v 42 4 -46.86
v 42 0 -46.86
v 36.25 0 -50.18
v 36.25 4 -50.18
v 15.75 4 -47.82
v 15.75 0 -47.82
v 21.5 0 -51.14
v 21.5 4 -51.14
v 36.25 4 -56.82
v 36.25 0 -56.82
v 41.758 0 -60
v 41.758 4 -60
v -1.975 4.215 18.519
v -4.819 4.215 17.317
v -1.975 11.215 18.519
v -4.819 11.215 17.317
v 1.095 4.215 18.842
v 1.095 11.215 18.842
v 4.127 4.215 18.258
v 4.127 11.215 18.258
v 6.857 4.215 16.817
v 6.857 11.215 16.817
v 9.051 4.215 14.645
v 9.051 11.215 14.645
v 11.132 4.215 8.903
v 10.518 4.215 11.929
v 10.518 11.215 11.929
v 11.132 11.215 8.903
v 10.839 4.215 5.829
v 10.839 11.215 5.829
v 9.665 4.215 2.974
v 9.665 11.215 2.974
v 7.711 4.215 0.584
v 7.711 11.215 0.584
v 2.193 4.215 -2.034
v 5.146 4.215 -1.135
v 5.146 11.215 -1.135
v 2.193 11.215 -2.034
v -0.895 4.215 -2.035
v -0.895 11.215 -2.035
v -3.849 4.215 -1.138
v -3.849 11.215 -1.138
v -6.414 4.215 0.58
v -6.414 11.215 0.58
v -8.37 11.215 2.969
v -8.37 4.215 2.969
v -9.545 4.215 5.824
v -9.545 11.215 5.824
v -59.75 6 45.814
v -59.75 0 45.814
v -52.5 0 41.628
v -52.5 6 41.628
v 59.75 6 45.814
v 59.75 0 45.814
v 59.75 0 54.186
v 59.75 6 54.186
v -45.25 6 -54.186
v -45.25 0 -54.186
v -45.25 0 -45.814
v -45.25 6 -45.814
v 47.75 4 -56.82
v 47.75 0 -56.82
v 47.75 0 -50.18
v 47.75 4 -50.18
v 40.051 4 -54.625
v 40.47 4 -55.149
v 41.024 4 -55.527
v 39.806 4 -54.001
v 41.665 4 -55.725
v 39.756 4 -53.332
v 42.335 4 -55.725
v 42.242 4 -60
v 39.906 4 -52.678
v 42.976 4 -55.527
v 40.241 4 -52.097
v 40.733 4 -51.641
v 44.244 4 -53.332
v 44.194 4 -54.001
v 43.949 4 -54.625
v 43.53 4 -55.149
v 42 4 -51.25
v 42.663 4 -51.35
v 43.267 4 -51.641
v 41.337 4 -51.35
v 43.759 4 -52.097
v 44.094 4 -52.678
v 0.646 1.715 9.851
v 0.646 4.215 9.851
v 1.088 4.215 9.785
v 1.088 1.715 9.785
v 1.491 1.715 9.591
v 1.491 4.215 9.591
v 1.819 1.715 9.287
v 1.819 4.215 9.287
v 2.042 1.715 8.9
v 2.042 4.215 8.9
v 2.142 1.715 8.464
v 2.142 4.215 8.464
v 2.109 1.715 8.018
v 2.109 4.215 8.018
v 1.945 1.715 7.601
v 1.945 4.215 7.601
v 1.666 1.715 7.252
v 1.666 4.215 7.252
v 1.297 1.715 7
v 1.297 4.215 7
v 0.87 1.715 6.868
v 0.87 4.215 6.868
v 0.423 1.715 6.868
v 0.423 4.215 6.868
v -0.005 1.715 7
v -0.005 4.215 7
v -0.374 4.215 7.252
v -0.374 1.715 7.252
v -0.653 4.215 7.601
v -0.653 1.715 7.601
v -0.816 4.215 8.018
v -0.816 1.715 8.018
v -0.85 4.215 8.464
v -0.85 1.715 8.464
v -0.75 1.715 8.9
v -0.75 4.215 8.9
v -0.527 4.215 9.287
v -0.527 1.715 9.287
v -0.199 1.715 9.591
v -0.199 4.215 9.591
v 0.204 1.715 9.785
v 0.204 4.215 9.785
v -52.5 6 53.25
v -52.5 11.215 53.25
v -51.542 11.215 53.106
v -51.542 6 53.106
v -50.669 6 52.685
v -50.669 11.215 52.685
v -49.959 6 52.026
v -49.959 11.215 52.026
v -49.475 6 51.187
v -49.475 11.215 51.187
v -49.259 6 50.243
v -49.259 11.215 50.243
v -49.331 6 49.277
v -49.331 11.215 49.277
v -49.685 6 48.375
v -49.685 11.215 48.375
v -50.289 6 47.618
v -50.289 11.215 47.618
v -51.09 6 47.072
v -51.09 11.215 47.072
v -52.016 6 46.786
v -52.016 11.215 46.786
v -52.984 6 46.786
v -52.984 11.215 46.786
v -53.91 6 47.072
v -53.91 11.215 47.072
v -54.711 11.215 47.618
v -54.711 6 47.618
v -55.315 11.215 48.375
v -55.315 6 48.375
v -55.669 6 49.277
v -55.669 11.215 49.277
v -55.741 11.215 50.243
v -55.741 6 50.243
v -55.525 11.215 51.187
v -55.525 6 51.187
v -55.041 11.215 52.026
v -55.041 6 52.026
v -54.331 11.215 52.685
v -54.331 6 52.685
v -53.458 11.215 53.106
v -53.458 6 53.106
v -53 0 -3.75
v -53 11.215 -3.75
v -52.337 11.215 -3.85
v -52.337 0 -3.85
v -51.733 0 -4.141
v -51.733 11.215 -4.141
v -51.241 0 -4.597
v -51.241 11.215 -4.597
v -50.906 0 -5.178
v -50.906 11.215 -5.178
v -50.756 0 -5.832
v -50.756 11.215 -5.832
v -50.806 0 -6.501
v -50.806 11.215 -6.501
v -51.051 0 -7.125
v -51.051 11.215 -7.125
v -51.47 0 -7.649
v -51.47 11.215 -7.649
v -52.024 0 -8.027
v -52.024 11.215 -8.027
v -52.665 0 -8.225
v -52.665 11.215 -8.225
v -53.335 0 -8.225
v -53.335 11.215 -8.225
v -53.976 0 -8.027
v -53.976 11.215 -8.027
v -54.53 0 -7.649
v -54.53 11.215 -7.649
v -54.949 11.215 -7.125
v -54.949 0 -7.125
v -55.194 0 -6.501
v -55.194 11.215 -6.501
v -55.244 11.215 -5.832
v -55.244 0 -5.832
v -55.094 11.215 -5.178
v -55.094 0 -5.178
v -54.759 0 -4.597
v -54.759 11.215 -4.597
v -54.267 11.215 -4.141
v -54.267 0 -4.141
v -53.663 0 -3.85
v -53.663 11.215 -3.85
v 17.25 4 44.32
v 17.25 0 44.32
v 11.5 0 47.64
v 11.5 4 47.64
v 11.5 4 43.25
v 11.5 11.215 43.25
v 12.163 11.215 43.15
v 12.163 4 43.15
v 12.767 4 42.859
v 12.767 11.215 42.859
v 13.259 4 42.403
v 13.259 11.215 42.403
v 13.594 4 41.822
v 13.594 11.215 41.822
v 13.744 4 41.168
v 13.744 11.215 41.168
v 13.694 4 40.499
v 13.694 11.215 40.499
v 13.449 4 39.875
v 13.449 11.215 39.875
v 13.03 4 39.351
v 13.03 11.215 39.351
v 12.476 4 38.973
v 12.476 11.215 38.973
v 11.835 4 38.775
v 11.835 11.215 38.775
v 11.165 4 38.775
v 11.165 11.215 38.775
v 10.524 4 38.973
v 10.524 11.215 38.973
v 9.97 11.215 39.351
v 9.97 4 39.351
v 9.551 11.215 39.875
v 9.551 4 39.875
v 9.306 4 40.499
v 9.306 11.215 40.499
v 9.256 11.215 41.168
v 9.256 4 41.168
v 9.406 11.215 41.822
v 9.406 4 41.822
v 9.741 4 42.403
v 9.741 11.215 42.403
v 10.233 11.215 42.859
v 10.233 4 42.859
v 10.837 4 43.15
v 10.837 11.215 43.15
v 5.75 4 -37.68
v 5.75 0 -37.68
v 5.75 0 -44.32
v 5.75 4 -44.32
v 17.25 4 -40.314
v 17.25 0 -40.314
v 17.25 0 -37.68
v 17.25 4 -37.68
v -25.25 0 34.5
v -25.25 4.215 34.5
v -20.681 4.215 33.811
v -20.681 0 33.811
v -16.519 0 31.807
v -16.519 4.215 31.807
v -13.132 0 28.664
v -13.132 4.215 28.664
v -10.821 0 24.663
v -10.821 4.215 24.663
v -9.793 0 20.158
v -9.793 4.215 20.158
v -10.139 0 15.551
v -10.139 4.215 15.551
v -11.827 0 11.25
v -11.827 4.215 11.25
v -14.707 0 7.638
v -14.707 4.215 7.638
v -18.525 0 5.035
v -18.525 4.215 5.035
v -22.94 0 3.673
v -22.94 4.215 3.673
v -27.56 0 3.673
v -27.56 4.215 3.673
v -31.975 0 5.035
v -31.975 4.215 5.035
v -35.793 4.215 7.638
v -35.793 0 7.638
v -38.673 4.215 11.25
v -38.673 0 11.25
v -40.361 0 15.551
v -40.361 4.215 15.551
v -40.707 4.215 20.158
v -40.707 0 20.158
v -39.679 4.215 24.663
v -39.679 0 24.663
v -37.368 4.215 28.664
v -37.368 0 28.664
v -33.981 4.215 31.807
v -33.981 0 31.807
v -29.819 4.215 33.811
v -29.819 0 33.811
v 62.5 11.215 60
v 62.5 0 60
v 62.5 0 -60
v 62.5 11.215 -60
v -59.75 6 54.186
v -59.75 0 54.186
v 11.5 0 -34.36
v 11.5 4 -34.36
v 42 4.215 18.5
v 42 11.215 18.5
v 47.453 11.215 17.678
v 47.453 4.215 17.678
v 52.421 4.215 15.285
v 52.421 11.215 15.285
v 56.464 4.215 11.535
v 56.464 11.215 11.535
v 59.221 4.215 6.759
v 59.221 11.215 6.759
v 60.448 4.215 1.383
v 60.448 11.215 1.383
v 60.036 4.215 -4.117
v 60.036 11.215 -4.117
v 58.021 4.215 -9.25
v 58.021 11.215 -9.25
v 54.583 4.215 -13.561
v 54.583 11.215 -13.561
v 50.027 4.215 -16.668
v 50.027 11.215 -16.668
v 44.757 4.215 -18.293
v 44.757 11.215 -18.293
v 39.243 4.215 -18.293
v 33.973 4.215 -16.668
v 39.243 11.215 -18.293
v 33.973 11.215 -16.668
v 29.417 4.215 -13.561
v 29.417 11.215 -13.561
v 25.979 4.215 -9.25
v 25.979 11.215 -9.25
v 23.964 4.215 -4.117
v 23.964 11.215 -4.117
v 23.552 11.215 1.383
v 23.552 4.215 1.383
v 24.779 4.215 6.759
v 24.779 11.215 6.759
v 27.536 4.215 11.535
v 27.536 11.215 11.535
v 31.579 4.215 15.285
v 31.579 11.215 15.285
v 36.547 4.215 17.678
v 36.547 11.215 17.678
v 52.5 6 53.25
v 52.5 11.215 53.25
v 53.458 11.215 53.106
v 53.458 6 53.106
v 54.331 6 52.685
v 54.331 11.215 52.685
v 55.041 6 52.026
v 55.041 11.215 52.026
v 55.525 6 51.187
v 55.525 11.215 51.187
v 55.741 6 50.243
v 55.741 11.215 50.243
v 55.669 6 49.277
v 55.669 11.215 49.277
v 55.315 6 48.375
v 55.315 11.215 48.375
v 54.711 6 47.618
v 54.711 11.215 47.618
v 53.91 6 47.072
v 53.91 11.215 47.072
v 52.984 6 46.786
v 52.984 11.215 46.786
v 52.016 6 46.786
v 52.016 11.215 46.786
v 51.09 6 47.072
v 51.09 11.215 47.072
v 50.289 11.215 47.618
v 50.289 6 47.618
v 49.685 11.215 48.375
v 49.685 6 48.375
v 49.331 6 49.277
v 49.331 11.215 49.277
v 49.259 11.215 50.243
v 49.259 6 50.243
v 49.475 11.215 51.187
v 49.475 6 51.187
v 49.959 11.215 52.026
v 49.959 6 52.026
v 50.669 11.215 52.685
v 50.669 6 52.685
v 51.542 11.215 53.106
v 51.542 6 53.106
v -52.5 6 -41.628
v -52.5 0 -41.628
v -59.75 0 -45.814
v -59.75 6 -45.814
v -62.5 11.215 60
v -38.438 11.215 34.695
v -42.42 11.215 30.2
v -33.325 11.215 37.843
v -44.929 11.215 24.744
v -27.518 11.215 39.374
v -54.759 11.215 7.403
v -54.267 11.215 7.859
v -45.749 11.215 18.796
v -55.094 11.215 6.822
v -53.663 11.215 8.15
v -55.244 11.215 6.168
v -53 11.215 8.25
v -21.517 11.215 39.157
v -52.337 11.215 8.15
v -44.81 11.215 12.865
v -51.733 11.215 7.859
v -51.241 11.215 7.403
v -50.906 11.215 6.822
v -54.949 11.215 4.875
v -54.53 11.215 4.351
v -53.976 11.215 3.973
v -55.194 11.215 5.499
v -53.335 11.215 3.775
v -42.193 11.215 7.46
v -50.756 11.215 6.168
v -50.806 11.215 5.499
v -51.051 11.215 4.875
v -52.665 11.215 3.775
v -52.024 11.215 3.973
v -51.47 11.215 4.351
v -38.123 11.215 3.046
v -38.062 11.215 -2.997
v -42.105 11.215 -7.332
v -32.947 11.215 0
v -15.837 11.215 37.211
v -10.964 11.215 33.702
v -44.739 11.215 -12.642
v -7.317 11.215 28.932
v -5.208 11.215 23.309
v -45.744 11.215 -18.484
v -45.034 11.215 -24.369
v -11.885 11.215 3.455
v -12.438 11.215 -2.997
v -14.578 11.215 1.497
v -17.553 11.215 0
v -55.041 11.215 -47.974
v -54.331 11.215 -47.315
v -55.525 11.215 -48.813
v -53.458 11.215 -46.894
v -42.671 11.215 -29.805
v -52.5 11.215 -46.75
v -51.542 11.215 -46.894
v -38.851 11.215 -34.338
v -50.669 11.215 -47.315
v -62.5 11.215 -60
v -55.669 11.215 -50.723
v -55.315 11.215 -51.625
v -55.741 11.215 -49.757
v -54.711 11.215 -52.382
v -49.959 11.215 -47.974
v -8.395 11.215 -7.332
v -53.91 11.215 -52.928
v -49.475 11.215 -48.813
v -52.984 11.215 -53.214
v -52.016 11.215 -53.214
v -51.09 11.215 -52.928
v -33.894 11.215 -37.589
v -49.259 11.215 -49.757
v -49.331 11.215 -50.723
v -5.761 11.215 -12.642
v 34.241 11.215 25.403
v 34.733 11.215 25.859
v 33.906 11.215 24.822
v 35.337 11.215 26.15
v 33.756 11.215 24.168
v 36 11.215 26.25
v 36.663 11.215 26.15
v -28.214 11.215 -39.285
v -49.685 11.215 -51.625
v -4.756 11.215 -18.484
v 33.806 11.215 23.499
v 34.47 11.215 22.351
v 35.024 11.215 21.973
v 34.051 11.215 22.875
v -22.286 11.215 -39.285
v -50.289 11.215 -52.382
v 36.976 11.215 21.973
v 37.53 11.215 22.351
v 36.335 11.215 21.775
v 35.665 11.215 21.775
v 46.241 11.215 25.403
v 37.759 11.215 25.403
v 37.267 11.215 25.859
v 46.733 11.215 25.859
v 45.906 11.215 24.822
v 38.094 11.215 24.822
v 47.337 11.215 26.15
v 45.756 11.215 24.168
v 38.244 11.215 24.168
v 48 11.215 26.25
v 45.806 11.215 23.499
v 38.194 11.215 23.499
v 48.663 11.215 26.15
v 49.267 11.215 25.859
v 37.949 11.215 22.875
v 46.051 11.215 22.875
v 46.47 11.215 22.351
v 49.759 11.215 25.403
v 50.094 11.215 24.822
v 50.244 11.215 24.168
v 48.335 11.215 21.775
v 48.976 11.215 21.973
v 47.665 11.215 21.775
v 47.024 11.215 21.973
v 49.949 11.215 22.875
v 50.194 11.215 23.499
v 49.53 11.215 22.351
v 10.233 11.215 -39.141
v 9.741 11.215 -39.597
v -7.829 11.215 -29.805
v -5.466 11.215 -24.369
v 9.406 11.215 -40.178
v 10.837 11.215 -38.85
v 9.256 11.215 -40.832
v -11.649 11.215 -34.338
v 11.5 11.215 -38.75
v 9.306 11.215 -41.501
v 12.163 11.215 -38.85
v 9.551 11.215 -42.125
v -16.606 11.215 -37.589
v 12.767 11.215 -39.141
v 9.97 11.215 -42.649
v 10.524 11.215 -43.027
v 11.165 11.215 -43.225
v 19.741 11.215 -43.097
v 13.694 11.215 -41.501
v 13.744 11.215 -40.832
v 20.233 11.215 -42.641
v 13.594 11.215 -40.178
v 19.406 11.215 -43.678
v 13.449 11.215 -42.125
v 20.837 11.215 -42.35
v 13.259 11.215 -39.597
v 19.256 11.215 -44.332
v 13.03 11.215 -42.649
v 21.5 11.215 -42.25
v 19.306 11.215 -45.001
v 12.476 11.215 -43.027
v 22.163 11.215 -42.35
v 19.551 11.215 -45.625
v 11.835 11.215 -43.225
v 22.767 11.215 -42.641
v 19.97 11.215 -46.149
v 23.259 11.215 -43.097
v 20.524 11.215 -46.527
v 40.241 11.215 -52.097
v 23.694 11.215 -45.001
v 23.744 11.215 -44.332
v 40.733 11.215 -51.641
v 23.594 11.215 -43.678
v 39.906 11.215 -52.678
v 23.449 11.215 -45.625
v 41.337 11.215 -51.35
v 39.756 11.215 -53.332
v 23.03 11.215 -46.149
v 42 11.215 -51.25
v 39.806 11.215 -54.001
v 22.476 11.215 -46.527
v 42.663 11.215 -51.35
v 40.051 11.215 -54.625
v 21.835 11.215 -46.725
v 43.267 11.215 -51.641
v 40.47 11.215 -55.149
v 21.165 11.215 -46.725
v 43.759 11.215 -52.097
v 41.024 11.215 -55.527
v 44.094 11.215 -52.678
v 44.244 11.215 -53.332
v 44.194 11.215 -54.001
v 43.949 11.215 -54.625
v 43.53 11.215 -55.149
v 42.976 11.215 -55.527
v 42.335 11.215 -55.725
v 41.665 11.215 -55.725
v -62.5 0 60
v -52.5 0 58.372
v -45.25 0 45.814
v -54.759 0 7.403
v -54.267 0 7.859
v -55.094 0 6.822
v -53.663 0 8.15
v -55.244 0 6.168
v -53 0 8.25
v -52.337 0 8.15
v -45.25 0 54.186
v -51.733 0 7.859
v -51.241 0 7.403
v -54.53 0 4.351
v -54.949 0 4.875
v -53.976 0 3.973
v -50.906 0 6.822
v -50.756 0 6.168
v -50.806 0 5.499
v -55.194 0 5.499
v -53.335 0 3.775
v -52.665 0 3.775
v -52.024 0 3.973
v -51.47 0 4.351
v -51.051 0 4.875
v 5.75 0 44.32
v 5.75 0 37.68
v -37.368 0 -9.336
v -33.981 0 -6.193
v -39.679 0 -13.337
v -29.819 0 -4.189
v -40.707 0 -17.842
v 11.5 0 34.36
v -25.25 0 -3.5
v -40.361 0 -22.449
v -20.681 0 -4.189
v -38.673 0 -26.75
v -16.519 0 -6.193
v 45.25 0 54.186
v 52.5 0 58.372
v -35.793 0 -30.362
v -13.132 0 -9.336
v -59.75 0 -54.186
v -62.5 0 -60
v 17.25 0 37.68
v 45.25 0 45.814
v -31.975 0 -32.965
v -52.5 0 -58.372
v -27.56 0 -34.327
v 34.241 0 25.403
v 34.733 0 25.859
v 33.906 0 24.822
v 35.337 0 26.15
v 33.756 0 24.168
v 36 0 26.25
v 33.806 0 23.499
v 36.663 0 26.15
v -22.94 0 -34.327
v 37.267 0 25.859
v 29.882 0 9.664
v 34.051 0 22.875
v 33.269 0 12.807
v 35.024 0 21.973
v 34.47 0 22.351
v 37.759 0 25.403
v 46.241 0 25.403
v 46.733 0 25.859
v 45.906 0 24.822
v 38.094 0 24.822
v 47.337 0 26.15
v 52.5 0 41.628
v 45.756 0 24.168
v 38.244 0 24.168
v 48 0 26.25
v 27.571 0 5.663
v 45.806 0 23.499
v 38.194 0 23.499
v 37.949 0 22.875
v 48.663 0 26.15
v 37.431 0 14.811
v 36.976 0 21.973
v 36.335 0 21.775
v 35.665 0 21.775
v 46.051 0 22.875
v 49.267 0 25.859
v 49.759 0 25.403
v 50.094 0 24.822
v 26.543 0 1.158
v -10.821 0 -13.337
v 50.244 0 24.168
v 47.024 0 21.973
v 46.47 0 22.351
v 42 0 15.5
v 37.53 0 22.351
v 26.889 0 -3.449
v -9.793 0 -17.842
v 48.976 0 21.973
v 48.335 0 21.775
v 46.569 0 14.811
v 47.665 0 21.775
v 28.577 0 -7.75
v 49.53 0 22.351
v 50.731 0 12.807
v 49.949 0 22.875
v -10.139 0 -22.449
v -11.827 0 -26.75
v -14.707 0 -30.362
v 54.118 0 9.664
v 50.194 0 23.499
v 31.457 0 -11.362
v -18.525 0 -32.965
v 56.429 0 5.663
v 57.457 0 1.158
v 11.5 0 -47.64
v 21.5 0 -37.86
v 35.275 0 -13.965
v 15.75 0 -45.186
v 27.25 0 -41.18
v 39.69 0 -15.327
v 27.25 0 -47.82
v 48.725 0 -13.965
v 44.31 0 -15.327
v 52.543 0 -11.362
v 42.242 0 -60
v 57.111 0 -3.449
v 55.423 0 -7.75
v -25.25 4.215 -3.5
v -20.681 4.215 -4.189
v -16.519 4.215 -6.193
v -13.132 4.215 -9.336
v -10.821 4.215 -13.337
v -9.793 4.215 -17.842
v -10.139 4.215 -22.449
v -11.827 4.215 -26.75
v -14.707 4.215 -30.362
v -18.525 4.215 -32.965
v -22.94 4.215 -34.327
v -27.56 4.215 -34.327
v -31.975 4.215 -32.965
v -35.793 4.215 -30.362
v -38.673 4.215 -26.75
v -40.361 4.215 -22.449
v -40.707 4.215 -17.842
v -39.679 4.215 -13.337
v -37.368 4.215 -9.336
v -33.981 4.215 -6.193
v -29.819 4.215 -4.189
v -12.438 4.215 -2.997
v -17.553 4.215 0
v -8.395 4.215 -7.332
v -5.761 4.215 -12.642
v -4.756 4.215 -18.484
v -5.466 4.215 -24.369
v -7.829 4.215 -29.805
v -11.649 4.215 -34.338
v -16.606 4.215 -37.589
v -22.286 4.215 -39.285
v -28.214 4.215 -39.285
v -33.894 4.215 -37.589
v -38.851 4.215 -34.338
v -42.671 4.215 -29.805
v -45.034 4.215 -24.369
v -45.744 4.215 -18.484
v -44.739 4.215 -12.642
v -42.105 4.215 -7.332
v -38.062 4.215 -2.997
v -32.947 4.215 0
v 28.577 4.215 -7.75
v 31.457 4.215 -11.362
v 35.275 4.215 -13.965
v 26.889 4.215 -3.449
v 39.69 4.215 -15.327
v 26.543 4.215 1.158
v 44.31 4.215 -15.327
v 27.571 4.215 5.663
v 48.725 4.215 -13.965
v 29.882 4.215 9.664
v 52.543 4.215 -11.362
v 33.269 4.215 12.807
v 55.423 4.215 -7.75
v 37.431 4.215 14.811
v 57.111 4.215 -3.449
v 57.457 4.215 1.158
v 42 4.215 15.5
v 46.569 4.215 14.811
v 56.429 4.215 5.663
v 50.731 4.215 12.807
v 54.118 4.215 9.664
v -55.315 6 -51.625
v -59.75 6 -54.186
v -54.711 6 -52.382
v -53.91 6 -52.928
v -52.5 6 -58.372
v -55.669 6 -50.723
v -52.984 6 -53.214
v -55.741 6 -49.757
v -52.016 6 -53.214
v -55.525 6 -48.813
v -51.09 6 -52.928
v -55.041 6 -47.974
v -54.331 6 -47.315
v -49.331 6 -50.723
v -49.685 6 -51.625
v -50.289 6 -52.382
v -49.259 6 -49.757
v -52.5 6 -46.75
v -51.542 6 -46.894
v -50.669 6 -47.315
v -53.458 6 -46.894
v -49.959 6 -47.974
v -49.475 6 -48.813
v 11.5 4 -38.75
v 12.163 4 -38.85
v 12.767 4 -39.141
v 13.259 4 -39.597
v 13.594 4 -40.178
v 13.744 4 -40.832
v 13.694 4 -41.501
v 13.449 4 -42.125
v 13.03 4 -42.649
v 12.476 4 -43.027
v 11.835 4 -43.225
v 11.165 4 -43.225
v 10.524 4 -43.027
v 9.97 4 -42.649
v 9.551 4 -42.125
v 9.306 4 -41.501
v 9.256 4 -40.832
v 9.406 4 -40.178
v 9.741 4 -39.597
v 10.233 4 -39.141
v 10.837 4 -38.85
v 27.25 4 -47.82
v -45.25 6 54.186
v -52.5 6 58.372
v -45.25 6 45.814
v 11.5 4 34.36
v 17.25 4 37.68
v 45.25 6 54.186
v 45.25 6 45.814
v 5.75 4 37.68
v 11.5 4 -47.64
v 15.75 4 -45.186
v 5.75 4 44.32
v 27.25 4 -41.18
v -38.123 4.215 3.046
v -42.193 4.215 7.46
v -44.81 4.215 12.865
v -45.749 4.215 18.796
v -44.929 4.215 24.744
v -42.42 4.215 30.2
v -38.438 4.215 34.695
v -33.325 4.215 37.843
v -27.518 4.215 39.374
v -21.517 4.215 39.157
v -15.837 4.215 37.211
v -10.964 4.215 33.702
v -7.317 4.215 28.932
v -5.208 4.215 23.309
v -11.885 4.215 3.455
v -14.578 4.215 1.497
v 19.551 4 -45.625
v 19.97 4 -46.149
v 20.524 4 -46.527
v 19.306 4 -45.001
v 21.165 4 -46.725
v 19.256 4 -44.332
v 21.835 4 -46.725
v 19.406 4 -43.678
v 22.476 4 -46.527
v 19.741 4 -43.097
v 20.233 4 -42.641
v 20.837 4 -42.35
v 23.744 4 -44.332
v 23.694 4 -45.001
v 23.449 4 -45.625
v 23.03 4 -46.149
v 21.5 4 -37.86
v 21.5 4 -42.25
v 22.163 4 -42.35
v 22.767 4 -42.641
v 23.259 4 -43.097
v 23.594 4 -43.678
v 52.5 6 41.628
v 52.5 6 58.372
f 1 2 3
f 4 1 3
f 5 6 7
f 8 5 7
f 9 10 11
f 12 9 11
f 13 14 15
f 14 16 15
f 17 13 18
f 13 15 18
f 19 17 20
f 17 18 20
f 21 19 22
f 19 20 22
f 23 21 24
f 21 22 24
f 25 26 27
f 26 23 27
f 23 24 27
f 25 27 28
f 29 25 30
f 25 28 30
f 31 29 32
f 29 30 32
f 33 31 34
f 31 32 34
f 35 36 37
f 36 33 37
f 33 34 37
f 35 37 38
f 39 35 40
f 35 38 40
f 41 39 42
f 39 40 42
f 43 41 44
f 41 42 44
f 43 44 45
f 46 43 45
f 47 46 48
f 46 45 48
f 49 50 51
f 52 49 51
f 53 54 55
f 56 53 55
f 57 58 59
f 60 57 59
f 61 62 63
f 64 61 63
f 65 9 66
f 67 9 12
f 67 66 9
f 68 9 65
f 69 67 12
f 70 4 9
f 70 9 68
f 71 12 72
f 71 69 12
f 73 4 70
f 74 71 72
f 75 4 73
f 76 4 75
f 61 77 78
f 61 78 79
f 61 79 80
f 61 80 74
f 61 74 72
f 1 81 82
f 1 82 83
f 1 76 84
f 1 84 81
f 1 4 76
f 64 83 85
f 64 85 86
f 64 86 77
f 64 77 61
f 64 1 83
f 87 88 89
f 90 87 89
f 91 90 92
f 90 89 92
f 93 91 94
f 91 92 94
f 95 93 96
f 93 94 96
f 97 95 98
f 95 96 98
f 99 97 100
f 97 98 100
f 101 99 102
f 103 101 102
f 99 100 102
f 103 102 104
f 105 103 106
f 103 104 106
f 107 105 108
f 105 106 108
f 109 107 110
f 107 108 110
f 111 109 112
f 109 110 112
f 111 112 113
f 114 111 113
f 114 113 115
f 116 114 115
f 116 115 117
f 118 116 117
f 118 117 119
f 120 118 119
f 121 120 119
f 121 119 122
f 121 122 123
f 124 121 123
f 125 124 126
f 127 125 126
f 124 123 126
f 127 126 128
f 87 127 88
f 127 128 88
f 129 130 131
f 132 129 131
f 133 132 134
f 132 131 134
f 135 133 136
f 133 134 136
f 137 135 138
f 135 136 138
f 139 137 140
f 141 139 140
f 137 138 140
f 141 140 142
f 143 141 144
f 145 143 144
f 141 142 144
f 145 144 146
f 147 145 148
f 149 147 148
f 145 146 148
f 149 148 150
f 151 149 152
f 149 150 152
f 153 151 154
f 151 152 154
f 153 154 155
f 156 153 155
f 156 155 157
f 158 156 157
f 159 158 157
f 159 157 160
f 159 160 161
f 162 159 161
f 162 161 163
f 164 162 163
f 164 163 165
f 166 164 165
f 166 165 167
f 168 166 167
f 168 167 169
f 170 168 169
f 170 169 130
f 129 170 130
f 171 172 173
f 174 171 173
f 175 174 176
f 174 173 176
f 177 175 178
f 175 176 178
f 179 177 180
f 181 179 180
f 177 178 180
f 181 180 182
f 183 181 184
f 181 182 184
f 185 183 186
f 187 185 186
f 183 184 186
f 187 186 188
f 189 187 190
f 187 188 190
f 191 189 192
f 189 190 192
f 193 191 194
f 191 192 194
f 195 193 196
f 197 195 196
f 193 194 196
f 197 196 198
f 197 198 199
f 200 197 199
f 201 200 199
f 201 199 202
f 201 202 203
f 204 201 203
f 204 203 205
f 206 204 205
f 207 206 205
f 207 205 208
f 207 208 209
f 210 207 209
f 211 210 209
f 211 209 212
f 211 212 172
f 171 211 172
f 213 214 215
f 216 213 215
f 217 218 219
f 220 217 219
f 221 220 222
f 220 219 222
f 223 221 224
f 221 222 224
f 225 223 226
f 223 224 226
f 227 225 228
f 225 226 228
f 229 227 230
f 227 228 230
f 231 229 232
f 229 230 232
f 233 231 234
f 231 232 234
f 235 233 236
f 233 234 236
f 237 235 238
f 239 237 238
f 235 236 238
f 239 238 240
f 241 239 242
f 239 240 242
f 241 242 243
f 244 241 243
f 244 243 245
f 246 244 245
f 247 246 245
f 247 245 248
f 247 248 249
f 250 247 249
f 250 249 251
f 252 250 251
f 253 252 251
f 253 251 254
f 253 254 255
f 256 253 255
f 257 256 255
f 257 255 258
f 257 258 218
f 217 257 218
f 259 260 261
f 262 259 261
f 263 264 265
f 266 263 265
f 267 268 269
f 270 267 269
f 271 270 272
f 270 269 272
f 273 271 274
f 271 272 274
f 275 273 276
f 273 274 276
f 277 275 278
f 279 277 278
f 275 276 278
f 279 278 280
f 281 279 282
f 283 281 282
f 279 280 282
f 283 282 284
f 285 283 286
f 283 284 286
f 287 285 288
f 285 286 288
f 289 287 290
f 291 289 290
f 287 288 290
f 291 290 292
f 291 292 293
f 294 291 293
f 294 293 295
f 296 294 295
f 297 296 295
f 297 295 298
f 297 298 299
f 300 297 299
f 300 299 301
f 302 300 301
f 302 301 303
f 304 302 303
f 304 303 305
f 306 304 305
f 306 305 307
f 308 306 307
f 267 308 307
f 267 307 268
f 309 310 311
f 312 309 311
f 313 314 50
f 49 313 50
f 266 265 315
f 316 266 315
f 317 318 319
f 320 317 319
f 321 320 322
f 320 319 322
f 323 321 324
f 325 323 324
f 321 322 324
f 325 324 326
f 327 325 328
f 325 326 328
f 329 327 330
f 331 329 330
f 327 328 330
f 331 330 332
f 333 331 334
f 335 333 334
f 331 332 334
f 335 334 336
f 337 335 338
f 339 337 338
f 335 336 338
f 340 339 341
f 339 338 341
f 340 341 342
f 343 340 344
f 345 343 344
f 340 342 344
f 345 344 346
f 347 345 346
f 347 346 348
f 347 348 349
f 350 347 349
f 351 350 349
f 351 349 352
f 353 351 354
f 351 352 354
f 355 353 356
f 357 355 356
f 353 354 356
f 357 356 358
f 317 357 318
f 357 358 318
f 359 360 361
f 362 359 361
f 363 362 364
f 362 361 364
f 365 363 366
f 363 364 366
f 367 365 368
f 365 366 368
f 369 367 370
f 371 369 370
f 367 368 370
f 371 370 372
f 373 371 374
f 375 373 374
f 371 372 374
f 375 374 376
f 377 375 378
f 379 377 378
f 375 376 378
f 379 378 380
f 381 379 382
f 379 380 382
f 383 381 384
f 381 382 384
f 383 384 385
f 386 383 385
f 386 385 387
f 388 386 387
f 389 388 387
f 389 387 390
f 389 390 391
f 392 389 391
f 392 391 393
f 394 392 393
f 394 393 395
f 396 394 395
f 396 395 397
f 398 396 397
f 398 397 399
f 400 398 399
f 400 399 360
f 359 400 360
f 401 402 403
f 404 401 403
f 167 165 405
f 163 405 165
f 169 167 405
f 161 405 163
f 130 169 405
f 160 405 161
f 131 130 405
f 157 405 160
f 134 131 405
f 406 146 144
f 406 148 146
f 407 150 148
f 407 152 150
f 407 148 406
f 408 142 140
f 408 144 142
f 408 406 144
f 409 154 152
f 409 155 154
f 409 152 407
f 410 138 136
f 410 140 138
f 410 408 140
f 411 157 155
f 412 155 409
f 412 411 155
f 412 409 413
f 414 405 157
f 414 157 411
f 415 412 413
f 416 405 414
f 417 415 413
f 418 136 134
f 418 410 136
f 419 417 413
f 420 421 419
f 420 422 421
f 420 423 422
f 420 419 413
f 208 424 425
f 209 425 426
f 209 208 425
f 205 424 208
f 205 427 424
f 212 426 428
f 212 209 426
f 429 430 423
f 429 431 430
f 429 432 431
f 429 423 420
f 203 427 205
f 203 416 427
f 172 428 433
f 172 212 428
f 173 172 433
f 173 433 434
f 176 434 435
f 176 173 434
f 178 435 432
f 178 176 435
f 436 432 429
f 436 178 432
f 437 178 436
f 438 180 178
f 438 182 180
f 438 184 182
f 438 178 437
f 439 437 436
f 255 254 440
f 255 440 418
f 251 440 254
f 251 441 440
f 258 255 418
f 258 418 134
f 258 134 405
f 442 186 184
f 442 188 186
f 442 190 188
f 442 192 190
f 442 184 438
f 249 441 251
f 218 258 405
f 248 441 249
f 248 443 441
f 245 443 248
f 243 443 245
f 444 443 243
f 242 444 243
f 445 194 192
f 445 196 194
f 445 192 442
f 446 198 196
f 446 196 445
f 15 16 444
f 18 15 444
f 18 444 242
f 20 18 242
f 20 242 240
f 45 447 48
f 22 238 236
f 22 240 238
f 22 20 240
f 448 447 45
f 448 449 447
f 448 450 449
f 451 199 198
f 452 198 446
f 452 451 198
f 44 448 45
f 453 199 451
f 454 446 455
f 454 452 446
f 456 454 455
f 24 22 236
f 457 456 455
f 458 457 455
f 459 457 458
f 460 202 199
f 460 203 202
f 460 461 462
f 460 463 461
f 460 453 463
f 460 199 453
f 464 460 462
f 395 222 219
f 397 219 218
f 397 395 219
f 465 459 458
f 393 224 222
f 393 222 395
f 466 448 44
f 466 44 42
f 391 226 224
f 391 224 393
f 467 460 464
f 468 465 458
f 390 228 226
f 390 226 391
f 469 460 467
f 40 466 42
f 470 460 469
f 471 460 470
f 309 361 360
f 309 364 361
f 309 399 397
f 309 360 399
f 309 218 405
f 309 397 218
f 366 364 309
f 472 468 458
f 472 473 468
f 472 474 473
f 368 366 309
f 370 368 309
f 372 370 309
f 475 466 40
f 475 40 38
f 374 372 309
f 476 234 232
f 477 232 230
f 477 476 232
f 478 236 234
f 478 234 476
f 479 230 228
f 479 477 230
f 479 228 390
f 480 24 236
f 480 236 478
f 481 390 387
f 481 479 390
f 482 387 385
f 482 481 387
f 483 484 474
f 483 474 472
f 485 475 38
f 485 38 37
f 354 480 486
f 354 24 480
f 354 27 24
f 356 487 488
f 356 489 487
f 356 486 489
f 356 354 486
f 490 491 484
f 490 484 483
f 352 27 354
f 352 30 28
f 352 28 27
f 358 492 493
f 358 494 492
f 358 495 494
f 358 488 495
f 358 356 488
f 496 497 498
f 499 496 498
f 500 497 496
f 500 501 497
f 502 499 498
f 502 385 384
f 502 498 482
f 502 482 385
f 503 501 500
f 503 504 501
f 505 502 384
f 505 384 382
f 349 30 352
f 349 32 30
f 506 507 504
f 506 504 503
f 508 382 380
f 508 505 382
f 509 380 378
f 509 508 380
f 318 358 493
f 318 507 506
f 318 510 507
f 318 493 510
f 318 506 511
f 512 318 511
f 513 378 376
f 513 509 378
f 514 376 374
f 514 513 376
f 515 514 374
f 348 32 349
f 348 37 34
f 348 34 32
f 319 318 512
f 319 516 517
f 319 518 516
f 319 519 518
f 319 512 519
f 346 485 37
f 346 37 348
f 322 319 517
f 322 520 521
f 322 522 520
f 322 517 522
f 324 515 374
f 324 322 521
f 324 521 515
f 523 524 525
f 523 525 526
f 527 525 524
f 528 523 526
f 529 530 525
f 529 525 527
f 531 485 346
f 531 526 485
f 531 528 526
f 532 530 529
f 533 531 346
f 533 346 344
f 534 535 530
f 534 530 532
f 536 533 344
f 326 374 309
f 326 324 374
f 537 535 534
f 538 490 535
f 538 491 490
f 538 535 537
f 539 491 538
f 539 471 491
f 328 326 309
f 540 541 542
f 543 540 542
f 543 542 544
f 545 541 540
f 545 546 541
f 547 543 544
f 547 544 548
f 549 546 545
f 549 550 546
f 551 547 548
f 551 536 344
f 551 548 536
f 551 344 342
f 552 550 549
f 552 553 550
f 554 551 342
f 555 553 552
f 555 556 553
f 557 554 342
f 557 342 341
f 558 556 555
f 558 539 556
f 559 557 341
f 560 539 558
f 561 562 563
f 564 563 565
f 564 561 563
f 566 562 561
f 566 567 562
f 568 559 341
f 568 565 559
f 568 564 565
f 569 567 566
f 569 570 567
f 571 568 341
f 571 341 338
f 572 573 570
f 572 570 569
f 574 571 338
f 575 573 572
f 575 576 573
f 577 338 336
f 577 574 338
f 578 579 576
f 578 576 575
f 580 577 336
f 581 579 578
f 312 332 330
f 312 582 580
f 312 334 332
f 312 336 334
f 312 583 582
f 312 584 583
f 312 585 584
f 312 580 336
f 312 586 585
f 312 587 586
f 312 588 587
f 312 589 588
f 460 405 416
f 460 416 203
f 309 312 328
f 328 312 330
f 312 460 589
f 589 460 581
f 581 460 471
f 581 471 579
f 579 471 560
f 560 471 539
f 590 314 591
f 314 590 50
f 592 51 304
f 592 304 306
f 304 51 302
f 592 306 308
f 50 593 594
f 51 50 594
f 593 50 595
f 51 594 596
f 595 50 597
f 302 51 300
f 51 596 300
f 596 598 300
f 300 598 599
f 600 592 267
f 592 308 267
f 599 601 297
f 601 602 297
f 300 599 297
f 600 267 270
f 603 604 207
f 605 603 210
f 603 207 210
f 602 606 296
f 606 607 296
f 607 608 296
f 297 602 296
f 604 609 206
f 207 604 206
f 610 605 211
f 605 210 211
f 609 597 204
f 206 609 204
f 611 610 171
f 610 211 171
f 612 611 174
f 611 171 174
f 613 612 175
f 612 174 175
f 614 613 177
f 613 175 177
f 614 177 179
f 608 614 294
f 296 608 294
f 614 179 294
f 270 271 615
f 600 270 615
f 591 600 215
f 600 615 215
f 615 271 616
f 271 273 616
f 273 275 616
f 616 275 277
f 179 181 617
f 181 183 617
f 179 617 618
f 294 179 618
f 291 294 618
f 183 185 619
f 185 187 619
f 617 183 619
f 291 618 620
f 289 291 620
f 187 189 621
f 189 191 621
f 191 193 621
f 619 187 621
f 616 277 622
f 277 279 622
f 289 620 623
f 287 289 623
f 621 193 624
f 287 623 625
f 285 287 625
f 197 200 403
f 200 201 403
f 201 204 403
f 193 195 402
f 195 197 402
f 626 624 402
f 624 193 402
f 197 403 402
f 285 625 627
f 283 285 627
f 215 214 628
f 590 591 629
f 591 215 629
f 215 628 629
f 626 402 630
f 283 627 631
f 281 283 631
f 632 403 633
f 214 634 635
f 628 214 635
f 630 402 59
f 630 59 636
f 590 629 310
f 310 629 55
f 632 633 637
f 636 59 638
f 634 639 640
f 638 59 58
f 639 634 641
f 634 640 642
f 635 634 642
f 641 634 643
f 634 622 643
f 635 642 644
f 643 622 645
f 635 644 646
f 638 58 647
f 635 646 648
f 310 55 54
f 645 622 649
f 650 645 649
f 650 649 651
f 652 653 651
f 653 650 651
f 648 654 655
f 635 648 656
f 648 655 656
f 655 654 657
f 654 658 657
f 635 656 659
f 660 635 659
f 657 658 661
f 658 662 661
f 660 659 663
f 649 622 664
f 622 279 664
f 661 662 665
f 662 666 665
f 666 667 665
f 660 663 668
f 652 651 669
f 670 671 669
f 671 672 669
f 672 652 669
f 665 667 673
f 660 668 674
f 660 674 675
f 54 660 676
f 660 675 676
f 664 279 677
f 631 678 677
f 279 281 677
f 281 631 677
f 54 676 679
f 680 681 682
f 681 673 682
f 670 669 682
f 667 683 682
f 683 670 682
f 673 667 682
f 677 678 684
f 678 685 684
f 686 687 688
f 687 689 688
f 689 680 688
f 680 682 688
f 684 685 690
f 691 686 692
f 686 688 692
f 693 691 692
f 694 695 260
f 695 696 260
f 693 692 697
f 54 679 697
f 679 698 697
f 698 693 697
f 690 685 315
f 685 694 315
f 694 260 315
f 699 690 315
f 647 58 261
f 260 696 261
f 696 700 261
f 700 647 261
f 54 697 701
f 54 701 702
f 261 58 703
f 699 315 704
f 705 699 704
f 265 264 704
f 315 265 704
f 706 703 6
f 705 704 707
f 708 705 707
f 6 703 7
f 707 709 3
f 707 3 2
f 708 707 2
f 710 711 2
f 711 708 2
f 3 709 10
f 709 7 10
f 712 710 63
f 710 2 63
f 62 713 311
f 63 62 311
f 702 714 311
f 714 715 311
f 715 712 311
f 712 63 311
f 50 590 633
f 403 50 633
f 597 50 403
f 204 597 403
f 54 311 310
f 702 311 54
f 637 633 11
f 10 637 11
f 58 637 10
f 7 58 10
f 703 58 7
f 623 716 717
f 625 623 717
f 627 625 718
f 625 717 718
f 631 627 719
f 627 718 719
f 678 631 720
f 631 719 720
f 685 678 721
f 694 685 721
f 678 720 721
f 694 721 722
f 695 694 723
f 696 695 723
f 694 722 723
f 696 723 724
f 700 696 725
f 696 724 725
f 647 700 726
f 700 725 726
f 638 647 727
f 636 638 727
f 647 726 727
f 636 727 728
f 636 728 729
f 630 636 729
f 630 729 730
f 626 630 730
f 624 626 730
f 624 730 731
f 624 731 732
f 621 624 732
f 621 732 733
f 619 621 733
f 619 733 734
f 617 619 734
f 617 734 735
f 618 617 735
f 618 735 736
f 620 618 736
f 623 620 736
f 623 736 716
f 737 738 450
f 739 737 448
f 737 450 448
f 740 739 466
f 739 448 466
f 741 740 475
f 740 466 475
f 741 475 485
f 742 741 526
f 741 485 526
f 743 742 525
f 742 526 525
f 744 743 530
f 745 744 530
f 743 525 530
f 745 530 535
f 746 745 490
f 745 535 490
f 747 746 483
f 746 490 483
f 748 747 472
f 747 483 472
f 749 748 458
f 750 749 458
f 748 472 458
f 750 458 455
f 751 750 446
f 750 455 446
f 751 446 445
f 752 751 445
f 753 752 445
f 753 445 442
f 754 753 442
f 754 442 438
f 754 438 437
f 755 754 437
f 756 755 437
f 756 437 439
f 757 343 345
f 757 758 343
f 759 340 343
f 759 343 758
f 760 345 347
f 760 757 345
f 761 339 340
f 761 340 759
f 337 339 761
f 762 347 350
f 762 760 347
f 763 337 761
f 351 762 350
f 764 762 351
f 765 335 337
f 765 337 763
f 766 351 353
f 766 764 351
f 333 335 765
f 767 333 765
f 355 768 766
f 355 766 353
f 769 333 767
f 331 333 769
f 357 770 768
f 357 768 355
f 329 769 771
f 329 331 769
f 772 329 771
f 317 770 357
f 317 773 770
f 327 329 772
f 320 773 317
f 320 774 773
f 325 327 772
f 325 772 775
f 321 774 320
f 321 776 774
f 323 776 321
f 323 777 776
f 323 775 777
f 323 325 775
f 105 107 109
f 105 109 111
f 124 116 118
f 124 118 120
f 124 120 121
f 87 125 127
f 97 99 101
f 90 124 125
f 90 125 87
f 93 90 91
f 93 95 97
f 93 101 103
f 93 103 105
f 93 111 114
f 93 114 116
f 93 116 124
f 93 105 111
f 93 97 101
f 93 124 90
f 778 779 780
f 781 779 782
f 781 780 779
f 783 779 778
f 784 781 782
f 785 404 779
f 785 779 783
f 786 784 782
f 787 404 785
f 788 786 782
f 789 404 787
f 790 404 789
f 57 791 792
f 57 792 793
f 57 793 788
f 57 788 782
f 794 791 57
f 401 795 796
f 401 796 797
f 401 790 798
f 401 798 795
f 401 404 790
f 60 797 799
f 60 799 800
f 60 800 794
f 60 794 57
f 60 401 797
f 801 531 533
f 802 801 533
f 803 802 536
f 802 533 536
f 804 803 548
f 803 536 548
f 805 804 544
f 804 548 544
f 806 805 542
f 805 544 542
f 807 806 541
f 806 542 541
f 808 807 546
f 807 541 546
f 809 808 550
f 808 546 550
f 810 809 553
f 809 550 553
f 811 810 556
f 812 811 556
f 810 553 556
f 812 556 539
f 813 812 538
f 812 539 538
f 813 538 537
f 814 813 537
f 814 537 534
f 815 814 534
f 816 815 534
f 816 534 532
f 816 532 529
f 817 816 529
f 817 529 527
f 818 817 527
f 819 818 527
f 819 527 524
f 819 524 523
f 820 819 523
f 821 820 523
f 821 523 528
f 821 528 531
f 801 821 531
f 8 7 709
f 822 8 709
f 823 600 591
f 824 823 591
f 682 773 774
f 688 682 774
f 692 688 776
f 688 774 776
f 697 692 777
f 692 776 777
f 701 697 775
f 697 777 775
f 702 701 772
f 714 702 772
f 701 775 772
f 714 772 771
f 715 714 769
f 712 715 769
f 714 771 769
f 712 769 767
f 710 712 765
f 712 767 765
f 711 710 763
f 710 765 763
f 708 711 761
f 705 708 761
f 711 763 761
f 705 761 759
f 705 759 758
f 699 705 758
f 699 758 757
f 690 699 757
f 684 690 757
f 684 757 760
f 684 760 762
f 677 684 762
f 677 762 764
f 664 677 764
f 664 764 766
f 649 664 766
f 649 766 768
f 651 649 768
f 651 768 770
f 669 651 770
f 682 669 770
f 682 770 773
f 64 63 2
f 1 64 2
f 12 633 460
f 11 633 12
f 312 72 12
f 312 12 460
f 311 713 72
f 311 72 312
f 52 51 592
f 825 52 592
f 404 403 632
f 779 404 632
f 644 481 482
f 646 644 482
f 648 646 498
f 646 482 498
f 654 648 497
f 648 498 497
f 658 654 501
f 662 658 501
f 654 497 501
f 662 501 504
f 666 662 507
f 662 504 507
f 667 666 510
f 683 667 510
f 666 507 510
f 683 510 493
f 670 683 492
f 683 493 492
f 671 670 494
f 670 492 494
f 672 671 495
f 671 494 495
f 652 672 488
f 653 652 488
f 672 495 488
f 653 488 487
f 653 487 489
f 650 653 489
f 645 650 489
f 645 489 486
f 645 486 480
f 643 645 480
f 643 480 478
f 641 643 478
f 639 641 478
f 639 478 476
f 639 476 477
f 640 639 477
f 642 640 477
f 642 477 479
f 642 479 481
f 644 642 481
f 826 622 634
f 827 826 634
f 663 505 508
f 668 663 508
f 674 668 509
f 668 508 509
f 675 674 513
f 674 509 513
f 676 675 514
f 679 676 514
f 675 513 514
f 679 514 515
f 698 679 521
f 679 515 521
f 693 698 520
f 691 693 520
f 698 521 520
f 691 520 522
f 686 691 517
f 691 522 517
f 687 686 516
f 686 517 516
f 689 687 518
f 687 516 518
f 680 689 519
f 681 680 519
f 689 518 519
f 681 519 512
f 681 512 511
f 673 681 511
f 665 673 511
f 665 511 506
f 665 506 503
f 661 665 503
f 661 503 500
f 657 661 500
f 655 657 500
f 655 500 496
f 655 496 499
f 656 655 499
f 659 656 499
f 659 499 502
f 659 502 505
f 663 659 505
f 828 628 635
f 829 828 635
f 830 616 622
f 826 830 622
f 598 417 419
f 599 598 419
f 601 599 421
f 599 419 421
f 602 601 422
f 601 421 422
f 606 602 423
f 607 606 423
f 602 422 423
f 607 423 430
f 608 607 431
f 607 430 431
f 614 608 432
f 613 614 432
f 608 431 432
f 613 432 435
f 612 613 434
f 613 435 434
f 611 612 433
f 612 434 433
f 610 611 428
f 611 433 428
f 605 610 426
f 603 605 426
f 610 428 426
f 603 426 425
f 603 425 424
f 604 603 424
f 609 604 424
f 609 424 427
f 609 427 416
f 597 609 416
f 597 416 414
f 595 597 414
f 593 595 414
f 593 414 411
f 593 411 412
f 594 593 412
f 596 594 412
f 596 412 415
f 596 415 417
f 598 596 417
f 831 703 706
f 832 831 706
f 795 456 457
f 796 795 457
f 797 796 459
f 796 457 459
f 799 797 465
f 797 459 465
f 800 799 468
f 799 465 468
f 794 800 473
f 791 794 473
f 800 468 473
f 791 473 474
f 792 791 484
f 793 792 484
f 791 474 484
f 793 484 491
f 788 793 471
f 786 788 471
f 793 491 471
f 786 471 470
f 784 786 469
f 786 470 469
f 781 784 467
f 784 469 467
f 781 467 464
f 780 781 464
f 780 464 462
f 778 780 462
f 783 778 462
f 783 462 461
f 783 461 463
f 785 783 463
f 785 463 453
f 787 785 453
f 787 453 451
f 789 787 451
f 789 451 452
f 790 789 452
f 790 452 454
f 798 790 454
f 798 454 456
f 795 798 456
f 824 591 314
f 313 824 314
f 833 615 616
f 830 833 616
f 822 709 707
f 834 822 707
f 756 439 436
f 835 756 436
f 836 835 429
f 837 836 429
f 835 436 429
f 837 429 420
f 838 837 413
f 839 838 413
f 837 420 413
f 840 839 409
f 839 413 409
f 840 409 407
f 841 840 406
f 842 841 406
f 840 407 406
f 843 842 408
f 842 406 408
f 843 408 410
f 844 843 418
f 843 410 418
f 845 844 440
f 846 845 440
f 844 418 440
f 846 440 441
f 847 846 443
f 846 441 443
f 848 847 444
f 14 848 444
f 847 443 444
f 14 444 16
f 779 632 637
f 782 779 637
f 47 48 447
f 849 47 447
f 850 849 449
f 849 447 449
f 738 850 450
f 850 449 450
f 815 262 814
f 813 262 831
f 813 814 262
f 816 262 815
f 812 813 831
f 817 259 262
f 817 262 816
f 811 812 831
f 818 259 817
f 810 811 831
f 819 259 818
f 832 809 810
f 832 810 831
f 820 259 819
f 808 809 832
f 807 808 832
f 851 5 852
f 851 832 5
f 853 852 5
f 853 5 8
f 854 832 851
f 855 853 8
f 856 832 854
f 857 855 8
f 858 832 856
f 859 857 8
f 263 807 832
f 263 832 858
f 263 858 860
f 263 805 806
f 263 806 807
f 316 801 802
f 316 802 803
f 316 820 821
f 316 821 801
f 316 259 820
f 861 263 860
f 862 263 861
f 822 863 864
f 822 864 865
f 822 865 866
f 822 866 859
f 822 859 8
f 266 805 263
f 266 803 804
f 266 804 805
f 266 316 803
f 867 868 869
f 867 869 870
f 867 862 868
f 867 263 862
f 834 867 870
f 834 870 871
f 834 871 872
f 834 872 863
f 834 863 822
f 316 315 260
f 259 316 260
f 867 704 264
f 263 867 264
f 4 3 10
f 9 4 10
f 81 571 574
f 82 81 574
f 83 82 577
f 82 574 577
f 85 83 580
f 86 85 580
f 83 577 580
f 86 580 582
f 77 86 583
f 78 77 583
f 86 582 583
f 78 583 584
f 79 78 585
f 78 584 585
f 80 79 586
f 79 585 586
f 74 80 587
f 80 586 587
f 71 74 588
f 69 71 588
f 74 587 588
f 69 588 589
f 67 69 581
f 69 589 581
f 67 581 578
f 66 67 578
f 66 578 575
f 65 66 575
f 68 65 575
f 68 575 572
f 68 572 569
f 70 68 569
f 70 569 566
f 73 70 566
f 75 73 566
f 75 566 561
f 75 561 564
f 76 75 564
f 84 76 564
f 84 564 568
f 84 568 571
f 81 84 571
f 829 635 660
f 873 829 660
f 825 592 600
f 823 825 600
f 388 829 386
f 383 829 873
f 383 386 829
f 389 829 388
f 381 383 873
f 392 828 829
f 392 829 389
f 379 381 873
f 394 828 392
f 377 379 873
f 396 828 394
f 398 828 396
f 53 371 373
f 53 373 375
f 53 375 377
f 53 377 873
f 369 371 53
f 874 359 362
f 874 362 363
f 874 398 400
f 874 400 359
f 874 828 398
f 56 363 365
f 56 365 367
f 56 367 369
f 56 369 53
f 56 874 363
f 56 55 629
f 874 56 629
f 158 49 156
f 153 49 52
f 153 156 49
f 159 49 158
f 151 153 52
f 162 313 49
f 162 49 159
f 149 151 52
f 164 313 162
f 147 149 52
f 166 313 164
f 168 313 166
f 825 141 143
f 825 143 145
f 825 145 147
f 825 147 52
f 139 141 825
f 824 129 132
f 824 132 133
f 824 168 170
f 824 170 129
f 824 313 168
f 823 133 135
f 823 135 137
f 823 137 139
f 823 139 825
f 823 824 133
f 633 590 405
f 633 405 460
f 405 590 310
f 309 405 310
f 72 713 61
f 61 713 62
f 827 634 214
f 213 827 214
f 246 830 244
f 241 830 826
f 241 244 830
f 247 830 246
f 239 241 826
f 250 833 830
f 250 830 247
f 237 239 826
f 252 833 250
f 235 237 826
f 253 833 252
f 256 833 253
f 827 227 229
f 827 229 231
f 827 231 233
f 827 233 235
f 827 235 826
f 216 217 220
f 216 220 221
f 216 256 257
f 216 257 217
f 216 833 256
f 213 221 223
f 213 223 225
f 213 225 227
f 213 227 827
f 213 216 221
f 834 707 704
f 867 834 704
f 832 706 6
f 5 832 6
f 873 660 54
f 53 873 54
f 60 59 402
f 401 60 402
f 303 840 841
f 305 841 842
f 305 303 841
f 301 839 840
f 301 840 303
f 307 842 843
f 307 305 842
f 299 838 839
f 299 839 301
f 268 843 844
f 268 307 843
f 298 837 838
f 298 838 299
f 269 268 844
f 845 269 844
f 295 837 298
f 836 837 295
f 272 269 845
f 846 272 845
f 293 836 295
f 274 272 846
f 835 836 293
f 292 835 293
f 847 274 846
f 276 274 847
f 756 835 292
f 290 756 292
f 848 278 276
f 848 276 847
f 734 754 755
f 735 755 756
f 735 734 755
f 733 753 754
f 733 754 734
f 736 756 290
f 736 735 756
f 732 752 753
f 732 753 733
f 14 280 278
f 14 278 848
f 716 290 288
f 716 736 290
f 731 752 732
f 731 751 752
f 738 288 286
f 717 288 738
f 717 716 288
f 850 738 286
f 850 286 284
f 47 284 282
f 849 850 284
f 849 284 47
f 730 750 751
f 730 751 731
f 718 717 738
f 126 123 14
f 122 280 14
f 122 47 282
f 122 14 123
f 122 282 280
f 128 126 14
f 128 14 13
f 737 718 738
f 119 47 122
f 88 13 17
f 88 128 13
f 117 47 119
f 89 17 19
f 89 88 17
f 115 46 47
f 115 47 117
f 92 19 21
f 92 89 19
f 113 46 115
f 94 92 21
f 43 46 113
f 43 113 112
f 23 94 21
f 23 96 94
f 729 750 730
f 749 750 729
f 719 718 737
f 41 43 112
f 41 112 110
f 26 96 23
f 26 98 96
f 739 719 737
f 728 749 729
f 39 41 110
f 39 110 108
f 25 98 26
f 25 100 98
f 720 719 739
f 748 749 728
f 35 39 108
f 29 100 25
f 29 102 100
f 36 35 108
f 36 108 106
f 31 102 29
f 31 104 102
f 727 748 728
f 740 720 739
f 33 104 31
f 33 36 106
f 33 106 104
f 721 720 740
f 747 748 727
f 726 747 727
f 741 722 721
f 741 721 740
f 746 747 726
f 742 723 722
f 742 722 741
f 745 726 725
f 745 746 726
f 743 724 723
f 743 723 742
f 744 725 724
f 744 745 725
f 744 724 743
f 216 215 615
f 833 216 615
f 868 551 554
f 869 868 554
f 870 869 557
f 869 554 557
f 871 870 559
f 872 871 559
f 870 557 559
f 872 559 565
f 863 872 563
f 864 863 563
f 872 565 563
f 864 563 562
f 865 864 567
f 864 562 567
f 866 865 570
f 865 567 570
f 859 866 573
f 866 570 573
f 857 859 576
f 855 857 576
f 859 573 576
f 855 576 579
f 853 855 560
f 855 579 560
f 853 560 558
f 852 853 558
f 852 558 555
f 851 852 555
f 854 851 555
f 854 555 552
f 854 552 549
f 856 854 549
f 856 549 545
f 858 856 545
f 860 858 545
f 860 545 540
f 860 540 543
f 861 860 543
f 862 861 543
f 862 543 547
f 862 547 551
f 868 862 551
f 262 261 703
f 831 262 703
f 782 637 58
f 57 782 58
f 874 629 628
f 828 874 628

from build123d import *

# Parameters (mm, degrees)
SKETCH1_W                        = 125
SKETCH1_H                        = 120
TEST_BASE_POSTION_DEPTH          = 11.215
SKETCH8_R                        = 20.5
FINGER_GEARS_DEPTH               = 7
SKETCH9_R                        = 10.5
INTERMEDIATE_GEAR_DEPTH          = 7
SKETCH11_R                       = 18.5
XL320_FINGER_KNUCKLE_MOUNT_DEPTH = 7
SKETCH10_R                       = 15.5
CONNECT_FINGER_HOLES_DEPTH       = 88.361468766
THUMB_MOUNT_HOLES_R              = 2.25
THUMB_MOUNT_HOLES_M4_DEPTH       = 88.361468766
SKETCH16_R                       = 2.25
FINGERS_MOUNT_HOLES_M4_DEPTH     = 88.361468766
SKETCH17_R                       = 3.25
CONNECT_HOLES_M6_DEPTH           = 88.361468766
NUTS_M4_DEPTH                    = 4
NUTS_M6_DEPTH                    = 6
SKETCH21_R                       = 1.5
FIX_GEAR_ROD_HOLE_DEPTH          = 2.5


with BuildPart() as part:
    # Sketch1 → Test_Base_Postion (new body)
    with BuildSketch(Plane(origin=(0, 0, 0), x_dir=(1, 0, 0), z_dir=(0, 1, 0))):
        Rectangle(SKETCH1_W, SKETCH1_H)
    extrude(amount=TEST_BASE_POSTION_DEPTH)

    # Sketch8 → Finger_Gears (cut)
    with BuildSketch(Plane(origin=(0, 11.215, 0), x_dir=(1, 0, 0), z_dir=(0, 1, 0))):
        with Locations((-25.25, -19)):
            Circle(SKETCH8_R)
        with Locations((-25.25, 19)):
            Circle(SKETCH8_R)
    extrude(amount=-FINGER_GEARS_DEPTH, mode=Mode.SUBTRACT)

    # Sketch9 → Intermediate_Gear (cut)
    with BuildSketch(Plane(origin=(0, 11.215, 0), x_dir=(1, 0, 0), z_dir=(0, 1, 0))):
        with Locations((0.646123438, -8.351488795)):
            Circle(SKETCH9_R)
    extrude(amount=-INTERMEDIATE_GEAR_DEPTH, mode=Mode.SUBTRACT)

    # Sketch11 → XL320_Finger_Knuckle_Mount (cut)
    with BuildSketch(Plane(origin=(0, 11.215, 0), x_dir=(1, 0, 0), z_dir=(0, 1, 0))):
        with Locations(Location((42, 0, 0), (0, 0, 270))):
            Circle(SKETCH11_R)
    extrude(amount=-XL320_FINGER_KNUCKLE_MOUNT_DEPTH, mode=Mode.SUBTRACT)

    # Sketch10 → Connect_Finger_Holes (cut, through all)
    with BuildSketch(Plane(origin=(0, 11.215, 0), x_dir=(1, 0, 0), z_dir=(0, 1, 0))):
        with Locations(Location((-25.25, 19, 0), (0, 0, 270))):
            Circle(SKETCH10_R)
        with Locations(Location((-25.25, -19, 0), (0, 0, 270))):
            Circle(SKETCH10_R)
        with Locations(Location((42, 0, 0), (0, 0, 270))):
            Circle(SKETCH10_R)
    extrude(amount=-CONNECT_FINGER_HOLES_DEPTH, mode=Mode.SUBTRACT)

    # Thumb_Mount_Holes → Thumb_Mount_Holes_(M4) (cut, through all)
    with BuildSketch(Plane(origin=(0, 11.215, 0), x_dir=(1, 0, 0), z_dir=(0, 1, 0))):
        with Locations(Location((21.5, 44.5, 0), (0, 0, 270))):
            Circle(THUMB_MOUNT_HOLES_R)
        with Locations(Location((42, 53.5, 0), (0, 0, 270))):
            Circle(THUMB_MOUNT_HOLES_R)
        with Locations(Location((48, -24, 0), (0, 0, 270))):
            Circle(THUMB_MOUNT_HOLES_R)
        with Locations(Location((36, -24, 0), (0, 0, 270))):
            Circle(THUMB_MOUNT_HOLES_R)
    extrude(amount=-THUMB_MOUNT_HOLES_M4_DEPTH, mode=Mode.SUBTRACT)

    # Sketch16 → Fingers_Mount_Holes_(M4) (cut, through all)
    with BuildSketch(Plane(origin=(0, 11.215, 0), x_dir=(1, 0, 0), z_dir=(0, 1, 0))):
        with Locations(Location((11.5, 41, 0), (0, 0, 270))):
            Circle(SKETCH16_R)
        with Locations(Location((11.5, -41, 0), (0, 0, 270))):
            Circle(SKETCH16_R)
        with Locations(Location((-53, 6, 0), (0, 0, 270))):
            Circle(SKETCH16_R)
        with Locations(Location((-53, -6, 0), (0, 0, 270))):
            Circle(SKETCH16_R)
    extrude(amount=-FINGERS_MOUNT_HOLES_M4_DEPTH, mode=Mode.SUBTRACT)

    # Sketch17 → Connect_Holes_(M6) (cut, through all)
    with BuildSketch(Plane(origin=(0, 11.215, 0), x_dir=(1, 0, 0), z_dir=(0, 1, 0))):
        with Locations(Location((-52.5, 50, 0), (0, 0, 270))):
            Circle(SKETCH17_R)
        with Locations(Location((-52.5, -50, 0), (0, 0, 270))):
            Circle(SKETCH17_R)
        with Locations(Location((52.5, -50, 0), (0, 0, 270))):
            Circle(SKETCH17_R)
    extrude(amount=-CONNECT_HOLES_M6_DEPTH, mode=Mode.SUBTRACT)

    # Sketch18 → Nuts_(M4) (cut)
    with BuildSketch(Plane.XZ):
        Polygon((11.5, 47.639528096), (5.75, 44.319764048), (5.75, 37.680235952), (11.5, 34.360471904), (17.25, 37.680235952), (17.25, 44.319764048), align=None)
        Polygon((11.5, -34.360471904), (5.75, -37.680235952), (5.75, -44.319764048), (11.5, -47.639528096), (17.25, -44.319764048), (17.25, -37.680235952), align=None)
        Polygon((15.75, -41.180235952), (15.75, -47.819764048), (21.5, -51.139528096), (27.25, -47.819764048), (27.25, -41.180235952), (21.5, -37.860471904), align=None)
        Polygon((42, -60.139528096), (47.75, -56.819764048), (47.75, -50.180235952), (42, -46.860471904), (36.25, -50.180235952), (36.25, -56.819764048), align=None)
    extrude(amount=-NUTS_M4_DEPTH, mode=Mode.SUBTRACT)

    # Sketch19 → Nuts_(M6) (cut)
    with BuildSketch(Plane.XZ):
        Polygon((-52.5, 58.371578903), (-59.75, 54.185789452), (-59.75, 45.814210548), (-52.5, 41.628421097), (-45.25, 45.814210548), (-45.25, 54.185789452), align=None)
        Polygon((52.5, 58.371578903), (45.25, 54.185789452), (45.25, 45.814210548), (52.5, 41.628421097), (59.75, 45.814210548), (59.75, 54.185789452), align=None)
        Polygon((-52.5, -41.628421097), (-59.75, -45.814210548), (-59.75, -54.185789452), (-52.5, -58.371578903), (-45.25, -54.185789452), (-45.25, -45.814210548), align=None)
    extrude(amount=-NUTS_M6_DEPTH, mode=Mode.SUBTRACT)

    # Sketch21 → Fix_Gear_Rod_Hole (cut)
    with BuildSketch(Plane(origin=(0, 4.215, 0), x_dir=(1, 0, 0), z_dir=(0, 1, 0))):
        with Locations(Location((0.646123438, -8.351488795, 0), (0, 0, 270))):
            Circle(SKETCH21_R)
    extrude(amount=-FIX_GEAR_ROD_HOLE_DEPTH, mode=Mode.SUBTRACT)


solid = part.part
